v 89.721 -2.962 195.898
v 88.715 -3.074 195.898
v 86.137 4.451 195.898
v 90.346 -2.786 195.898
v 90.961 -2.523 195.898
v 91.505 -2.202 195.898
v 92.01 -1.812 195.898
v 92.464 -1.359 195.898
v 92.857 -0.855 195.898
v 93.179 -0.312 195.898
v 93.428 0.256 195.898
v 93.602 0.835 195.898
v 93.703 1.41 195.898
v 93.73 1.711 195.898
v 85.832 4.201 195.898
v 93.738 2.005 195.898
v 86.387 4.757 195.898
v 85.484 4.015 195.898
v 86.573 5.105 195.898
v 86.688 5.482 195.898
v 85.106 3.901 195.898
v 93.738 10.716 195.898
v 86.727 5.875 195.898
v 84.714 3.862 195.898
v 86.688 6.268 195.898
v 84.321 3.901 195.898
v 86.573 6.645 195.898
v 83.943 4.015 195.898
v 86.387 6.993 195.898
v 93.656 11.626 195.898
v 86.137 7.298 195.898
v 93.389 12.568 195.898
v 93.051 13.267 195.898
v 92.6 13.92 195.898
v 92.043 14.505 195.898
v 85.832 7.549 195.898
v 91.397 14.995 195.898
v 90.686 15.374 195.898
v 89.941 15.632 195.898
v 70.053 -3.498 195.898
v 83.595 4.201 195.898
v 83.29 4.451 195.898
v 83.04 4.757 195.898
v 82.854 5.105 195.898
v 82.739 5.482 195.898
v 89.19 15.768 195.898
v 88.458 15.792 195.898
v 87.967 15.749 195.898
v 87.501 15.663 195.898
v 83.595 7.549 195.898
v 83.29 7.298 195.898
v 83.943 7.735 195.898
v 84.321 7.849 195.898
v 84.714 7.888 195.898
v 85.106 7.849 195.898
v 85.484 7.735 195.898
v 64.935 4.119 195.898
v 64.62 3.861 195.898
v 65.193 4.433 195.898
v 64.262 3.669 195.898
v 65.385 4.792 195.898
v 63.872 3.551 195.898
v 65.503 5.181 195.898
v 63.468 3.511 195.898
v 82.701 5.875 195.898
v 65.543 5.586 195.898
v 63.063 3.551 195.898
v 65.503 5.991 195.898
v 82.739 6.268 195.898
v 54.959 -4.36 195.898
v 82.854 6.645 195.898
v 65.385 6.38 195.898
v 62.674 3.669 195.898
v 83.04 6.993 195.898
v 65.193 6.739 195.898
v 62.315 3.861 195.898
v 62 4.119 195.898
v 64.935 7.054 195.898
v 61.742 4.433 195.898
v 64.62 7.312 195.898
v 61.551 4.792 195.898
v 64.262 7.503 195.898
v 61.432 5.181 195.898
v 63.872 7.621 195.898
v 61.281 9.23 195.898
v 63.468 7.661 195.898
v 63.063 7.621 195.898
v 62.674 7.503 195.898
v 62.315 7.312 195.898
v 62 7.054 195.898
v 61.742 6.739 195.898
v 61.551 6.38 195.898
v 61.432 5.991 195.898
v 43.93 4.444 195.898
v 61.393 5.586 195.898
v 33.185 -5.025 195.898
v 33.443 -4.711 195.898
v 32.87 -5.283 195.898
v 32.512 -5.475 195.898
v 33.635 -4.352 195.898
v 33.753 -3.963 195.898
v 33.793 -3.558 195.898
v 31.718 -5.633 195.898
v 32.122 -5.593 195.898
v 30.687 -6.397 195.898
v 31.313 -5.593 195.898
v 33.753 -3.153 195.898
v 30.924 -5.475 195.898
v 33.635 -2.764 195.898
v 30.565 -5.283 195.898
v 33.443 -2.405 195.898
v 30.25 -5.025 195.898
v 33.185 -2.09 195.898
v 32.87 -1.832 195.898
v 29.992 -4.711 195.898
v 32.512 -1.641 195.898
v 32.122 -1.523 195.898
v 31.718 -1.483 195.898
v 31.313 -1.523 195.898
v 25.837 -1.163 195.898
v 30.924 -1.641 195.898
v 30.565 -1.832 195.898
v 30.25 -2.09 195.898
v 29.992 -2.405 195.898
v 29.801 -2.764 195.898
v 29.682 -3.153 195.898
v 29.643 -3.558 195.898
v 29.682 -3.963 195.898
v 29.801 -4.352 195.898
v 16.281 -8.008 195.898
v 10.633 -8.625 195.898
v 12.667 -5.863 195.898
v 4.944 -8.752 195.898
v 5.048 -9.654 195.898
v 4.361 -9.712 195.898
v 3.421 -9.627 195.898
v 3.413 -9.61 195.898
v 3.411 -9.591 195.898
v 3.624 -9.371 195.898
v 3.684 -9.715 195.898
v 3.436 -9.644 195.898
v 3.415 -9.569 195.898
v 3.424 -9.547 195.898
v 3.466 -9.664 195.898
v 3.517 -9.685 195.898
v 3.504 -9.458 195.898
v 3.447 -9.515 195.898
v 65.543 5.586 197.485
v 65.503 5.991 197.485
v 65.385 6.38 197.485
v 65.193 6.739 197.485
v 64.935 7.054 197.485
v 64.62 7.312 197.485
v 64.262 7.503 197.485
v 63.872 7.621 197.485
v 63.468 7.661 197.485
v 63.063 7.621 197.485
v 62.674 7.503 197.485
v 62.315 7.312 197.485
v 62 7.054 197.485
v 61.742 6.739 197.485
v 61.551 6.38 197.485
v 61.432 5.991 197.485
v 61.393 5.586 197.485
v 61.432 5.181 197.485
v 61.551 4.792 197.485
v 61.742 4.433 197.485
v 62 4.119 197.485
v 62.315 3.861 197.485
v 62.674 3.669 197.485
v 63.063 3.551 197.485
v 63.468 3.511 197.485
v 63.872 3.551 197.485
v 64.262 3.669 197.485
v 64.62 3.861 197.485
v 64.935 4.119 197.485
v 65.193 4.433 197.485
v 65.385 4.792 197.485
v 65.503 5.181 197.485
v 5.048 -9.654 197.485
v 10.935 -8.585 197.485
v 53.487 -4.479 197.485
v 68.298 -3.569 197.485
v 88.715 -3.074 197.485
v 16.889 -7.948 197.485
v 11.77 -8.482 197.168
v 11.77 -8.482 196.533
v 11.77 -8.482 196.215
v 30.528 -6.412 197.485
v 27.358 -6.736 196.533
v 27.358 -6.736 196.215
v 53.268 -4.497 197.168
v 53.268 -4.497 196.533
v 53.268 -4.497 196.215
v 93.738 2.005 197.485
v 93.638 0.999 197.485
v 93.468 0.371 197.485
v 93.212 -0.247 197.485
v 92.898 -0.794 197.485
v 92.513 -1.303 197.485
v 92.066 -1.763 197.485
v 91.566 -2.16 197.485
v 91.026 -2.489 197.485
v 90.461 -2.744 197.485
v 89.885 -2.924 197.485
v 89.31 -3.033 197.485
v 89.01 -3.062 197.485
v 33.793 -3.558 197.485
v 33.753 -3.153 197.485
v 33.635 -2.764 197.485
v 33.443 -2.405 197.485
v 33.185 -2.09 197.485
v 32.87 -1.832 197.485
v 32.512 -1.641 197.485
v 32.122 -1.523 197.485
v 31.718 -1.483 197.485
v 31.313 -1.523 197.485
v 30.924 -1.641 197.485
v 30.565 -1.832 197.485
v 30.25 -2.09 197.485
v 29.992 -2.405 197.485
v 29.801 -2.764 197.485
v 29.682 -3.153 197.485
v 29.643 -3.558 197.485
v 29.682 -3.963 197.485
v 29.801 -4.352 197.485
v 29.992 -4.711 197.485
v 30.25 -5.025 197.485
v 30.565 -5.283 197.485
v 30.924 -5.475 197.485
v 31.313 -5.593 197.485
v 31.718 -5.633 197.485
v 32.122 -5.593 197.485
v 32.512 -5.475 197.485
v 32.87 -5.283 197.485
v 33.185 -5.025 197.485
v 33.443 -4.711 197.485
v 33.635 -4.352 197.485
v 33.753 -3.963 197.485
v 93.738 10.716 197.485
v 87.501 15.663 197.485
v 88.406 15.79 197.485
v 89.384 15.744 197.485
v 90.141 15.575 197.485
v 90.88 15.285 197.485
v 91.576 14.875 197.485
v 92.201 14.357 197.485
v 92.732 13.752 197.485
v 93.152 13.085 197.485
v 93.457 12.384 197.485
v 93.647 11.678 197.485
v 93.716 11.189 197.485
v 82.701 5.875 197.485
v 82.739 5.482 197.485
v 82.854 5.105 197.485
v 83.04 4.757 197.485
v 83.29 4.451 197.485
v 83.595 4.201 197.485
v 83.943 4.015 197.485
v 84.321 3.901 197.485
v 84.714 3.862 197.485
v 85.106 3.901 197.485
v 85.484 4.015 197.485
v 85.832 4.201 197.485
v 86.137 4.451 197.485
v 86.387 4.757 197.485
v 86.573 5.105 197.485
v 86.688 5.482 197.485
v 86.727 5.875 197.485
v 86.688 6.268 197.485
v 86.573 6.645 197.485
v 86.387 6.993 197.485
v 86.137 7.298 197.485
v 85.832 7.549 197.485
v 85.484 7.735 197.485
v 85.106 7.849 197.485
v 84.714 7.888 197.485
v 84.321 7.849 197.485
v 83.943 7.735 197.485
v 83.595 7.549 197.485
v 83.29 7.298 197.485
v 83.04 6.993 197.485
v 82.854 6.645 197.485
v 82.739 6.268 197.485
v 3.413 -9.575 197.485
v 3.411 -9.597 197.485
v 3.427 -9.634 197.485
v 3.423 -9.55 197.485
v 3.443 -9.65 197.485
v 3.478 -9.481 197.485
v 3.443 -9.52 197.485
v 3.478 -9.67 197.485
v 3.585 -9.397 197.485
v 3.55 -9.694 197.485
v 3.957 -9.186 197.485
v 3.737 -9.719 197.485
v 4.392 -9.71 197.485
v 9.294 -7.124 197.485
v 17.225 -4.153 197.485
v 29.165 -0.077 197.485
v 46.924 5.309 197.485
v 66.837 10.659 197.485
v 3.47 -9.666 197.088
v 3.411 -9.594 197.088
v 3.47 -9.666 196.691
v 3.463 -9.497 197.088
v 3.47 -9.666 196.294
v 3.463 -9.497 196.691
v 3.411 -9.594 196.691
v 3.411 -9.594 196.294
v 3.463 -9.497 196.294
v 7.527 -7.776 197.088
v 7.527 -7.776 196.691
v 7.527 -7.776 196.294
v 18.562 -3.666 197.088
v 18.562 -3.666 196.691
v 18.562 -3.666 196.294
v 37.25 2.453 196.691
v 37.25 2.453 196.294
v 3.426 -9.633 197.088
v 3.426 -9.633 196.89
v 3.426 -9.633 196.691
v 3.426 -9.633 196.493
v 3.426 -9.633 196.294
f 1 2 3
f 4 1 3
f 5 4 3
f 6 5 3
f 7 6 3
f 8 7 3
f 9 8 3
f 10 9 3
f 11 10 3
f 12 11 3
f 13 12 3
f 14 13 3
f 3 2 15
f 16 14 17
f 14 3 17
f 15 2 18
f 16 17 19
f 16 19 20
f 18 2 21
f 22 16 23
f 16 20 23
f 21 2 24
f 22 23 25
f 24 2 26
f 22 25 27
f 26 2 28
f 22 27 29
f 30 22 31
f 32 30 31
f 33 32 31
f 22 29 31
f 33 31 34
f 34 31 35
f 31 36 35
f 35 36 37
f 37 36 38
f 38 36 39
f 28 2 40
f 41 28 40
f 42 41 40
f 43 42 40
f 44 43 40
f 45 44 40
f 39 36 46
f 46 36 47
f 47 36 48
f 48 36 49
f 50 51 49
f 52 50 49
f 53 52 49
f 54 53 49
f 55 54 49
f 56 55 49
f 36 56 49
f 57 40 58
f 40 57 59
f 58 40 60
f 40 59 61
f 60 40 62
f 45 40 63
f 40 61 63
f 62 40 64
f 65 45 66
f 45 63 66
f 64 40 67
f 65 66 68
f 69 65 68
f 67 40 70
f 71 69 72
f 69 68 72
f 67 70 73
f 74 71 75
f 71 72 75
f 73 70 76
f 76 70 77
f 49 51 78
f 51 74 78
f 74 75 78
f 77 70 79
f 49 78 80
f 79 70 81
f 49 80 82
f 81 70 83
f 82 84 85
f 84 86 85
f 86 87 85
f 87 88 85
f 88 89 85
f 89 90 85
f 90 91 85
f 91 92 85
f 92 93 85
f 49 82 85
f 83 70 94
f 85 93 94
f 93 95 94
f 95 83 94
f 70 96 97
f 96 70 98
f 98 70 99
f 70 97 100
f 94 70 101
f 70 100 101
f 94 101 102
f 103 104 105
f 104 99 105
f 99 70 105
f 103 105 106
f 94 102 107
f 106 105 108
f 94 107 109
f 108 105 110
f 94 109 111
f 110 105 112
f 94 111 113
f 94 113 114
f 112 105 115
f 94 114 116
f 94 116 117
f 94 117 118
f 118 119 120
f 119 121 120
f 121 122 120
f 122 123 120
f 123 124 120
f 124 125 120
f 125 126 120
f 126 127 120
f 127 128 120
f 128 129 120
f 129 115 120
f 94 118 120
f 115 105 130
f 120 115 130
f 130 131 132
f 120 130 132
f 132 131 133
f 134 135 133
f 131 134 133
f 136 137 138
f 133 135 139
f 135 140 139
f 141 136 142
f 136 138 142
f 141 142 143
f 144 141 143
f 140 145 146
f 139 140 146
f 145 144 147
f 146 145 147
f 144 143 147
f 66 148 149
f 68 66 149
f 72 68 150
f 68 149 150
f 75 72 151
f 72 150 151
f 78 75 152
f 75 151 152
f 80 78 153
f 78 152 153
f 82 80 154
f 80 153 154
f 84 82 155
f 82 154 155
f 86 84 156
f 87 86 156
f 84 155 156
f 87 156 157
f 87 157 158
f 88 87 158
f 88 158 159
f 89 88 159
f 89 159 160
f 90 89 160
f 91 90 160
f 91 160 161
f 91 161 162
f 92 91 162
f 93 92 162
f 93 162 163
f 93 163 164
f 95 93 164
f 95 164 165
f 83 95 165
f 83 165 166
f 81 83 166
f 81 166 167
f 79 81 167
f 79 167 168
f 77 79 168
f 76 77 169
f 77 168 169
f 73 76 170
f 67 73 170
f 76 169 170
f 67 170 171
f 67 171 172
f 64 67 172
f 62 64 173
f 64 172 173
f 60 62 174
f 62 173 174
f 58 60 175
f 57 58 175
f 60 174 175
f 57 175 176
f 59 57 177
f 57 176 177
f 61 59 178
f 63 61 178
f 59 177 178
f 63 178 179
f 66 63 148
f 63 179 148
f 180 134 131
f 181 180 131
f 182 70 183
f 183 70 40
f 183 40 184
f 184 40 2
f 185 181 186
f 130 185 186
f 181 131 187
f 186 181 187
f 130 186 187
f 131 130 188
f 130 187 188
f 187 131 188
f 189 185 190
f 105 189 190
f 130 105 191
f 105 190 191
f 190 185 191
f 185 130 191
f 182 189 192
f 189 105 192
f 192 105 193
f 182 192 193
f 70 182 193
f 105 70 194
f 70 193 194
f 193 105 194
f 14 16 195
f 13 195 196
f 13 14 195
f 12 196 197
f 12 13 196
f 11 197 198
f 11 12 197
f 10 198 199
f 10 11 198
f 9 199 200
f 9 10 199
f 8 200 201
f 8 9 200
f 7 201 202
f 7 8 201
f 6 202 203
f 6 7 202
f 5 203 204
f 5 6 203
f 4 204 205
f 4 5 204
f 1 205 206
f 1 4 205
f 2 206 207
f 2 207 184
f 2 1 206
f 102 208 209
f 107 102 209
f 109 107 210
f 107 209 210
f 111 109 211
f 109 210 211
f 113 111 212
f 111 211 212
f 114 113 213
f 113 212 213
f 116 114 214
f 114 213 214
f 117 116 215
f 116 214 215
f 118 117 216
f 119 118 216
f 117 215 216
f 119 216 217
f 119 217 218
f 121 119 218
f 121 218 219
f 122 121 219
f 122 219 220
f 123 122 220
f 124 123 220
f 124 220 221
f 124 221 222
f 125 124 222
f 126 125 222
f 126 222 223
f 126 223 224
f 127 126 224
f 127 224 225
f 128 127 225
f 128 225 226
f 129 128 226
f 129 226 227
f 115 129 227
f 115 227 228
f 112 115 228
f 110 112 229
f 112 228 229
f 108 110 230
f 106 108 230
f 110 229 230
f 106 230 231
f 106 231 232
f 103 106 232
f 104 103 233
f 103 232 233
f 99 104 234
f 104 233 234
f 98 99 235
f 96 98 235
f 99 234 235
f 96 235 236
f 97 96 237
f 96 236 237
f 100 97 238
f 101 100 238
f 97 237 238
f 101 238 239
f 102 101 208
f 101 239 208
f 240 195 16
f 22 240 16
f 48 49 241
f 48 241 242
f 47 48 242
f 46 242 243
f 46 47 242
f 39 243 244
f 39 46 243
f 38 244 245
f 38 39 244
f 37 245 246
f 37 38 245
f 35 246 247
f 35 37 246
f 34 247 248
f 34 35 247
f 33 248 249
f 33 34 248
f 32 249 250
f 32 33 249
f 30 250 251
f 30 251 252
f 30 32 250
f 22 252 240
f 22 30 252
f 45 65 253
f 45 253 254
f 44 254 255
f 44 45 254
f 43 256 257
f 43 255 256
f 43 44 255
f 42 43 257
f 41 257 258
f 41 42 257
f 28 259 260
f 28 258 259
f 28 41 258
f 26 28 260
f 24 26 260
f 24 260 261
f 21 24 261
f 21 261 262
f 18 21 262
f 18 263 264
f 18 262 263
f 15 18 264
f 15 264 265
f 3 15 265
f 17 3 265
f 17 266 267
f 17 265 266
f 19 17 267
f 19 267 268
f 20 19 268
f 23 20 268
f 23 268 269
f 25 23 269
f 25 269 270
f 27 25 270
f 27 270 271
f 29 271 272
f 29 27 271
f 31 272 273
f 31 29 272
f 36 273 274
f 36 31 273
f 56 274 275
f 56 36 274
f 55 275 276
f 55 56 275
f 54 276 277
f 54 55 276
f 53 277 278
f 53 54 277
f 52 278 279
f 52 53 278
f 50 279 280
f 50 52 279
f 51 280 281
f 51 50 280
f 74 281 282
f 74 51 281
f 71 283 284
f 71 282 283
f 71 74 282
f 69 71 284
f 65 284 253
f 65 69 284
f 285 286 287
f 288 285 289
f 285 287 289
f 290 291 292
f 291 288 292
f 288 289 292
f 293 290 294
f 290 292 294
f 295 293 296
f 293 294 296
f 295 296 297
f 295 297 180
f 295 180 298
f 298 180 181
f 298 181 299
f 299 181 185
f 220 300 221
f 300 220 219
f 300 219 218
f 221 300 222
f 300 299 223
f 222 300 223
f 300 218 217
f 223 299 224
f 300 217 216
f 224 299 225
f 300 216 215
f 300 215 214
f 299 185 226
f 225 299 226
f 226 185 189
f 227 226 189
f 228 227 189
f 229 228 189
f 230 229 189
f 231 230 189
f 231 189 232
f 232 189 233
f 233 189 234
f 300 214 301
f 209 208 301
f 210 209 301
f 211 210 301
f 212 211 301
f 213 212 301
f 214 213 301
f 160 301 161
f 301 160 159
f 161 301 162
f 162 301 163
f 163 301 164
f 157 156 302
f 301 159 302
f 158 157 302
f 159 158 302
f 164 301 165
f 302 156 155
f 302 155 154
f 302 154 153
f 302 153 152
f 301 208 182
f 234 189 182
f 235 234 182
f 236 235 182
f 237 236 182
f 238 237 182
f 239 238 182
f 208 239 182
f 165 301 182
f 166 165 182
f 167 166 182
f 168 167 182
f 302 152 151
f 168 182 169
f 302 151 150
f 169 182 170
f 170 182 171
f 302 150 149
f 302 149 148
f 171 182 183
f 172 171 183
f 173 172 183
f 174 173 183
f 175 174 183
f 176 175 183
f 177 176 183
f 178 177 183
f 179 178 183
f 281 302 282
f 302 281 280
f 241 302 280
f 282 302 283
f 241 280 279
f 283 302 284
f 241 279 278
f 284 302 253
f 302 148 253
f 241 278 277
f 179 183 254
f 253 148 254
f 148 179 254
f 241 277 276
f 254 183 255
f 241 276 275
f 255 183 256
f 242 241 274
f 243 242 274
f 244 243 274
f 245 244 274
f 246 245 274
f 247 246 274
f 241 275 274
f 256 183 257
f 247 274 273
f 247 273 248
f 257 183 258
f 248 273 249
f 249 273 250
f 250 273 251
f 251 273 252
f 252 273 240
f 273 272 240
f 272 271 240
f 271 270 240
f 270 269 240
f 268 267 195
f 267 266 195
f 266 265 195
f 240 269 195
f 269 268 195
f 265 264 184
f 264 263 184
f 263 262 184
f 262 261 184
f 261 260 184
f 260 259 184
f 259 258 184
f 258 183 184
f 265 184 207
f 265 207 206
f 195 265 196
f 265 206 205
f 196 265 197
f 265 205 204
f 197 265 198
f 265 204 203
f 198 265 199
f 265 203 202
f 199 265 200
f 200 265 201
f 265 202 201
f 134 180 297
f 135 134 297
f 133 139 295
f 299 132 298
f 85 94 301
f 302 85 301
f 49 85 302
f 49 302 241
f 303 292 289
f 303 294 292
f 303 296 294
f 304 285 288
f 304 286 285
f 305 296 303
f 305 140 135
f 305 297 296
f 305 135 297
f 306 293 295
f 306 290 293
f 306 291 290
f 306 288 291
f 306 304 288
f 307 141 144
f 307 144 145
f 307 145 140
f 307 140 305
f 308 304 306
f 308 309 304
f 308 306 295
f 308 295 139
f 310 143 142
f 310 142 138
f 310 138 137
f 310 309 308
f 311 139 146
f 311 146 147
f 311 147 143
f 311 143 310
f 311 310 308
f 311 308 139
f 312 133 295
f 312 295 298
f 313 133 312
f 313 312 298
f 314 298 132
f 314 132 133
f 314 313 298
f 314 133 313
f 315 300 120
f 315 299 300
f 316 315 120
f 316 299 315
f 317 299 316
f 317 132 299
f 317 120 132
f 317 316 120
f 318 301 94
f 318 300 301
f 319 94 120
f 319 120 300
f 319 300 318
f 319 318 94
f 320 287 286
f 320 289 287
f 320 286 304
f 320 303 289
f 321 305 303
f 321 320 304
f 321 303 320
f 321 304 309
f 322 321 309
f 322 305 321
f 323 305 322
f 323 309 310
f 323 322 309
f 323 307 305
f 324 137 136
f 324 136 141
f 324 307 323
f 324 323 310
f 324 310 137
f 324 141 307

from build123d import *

# Parameters (mm, degrees)
BOSS_EXTRUDE1_DEPTH     = 226.06
CUT_EXTRUDE1_DEPTH      = 248.603669875
CUT_EXTRUDE1_DEPTH_BACK = 248.603669875
FILLET1_R               = 5.08
SKETCH4_W               = 41.117340127
SKETCH4_H               = 67.644656338
SKETCH4_W_2             = 211.282523513
SKETCH4_H_2             = 81.730555137
CUT_EXTRUDE5_DEPTH      = 246.233624371
SKETCH3_R               = 2.01295
CUT_EXTRUDE2_DEPTH      = 220.17283623
SKETCH5_R               = 2.075
CUT_EXTRUDE6_DEPTH      = 96.073271919


with BuildPart() as part:
    # Sketch1 → Boss-Extrude1 (new body)
    with BuildSketch(Plane.XY):
        with BuildLine():
            Line((99.32639085, 18.404394796), (99.32639085, -2.986448862))
            add(Edge.make_bspline(
                [(5.047603806, -9.653713384), (9.482649657, -8.546128483), (16.988483729, -8.076906091), (30.336595099, -6.254410192), (41.946659702, -5.566037344), (65.865842143, -3.231342143), (83.974811725, -3.089086557), (99.32639085, -2.986448862)],
                knots=[0, 0, 0, 0, 0.144322392, 0.237947652, 0.42712275, 0.512831912, 1, 1, 1, 1], degree=3))
            add(Edge.make_bspline(
                [(5.047603806, -9.653713384), (1.304537033, -10.042523479), (11.503328192, -6.353494655), (19.723627138, -3.092777487), (52.915151131, 7.645918304), (77.889766355, 13.460013374), (99.32639085, 18.404394796)],
                knots=[0, 0, 0, 0, 0.059914523, 0.175786391, 0.369274689, 1, 1, 1, 1], degree=3))
        make_face()
    extrude(amount=BOSS_EXTRUDE1_DEPTH)

    # Sketch2 → Cut-Extrude1 (cut, two sides: drawn at the far end of the back side and taken through both)
    with BuildSketch(Plane(origin=(0, 0, 0), x_dir=(1, 0, 0), z_dir=(0, 1, 0)).offset(-CUT_EXTRUDE1_DEPTH_BACK)):
        Polygon((169.681502528, 0), (169.681502528, -226.06), (73.16439085, -226.06), (73.16439085, -197.485), (93.73839085, -197.485), (93.73839085, -28.575), (73.16439085, -28.575), (73.16439085, 0), align=None)
    extrude(amount=CUT_EXTRUDE1_DEPTH + CUT_EXTRUDE1_DEPTH_BACK, mode=Mode.SUBTRACT)

    # Fillet1
    fillet1_edges = [part.edges().sort_by_distance(p)[0] for p in [
        (73.16439085, -3.388889971, 14.2875),
        (73.16439085, 12.236004014, 14.2875),
        (93.73839085, -3.026654485, 113.03),
        (93.73839085, 17.113551214, 113.03),
        (73.16439085, -3.388889971, 211.7725),
        (73.16439085, 12.236004014, 211.7725),
    ]]
    fillet(fillet1_edges, radius=FILLET1_R)

    # Sketch4 → Cut-Extrude5 (cut, through all)
    with BuildSketch(Plane(origin=(0, 0, 0), x_dir=(0, 0, -1), z_dir=(1, 0, 0))):
        with Locations((-218.043670064, 8.278534275)):
            Rectangle(SKETCH4_W, SKETCH4_H)
        with Locations((-90.256238244, 1.235584875)):
            Rectangle(SKETCH4_W_2, SKETCH4_H_2)
    extrude(amount=CUT_EXTRUDE5_DEPTH, mode=Mode.SUBTRACT)

    # Sketch3 → Cut-Extrude2 (cut, through all)
    with BuildSketch(Plane.XY):
        with Locations(Location((84.713563037, 5.874854857, 0), (0, 0, 180))):
            Circle(SKETCH3_R)
    extrude(amount=CUT_EXTRUDE2_DEPTH, mode=Mode.SUBTRACT)

    # Sketch5 → Cut-Extrude6 (cut, through all)
    with BuildSketch(Plane.XY.offset(197.485)):
        with Locations((31.717603806, -3.557713384)):
            Circle(SKETCH5_R)
        with Locations((63.467603806, 5.586286616)):
            Circle(SKETCH5_R)
    extrude(amount=-CUT_EXTRUDE6_DEPTH, mode=Mode.SUBTRACT)


solid = part.part
